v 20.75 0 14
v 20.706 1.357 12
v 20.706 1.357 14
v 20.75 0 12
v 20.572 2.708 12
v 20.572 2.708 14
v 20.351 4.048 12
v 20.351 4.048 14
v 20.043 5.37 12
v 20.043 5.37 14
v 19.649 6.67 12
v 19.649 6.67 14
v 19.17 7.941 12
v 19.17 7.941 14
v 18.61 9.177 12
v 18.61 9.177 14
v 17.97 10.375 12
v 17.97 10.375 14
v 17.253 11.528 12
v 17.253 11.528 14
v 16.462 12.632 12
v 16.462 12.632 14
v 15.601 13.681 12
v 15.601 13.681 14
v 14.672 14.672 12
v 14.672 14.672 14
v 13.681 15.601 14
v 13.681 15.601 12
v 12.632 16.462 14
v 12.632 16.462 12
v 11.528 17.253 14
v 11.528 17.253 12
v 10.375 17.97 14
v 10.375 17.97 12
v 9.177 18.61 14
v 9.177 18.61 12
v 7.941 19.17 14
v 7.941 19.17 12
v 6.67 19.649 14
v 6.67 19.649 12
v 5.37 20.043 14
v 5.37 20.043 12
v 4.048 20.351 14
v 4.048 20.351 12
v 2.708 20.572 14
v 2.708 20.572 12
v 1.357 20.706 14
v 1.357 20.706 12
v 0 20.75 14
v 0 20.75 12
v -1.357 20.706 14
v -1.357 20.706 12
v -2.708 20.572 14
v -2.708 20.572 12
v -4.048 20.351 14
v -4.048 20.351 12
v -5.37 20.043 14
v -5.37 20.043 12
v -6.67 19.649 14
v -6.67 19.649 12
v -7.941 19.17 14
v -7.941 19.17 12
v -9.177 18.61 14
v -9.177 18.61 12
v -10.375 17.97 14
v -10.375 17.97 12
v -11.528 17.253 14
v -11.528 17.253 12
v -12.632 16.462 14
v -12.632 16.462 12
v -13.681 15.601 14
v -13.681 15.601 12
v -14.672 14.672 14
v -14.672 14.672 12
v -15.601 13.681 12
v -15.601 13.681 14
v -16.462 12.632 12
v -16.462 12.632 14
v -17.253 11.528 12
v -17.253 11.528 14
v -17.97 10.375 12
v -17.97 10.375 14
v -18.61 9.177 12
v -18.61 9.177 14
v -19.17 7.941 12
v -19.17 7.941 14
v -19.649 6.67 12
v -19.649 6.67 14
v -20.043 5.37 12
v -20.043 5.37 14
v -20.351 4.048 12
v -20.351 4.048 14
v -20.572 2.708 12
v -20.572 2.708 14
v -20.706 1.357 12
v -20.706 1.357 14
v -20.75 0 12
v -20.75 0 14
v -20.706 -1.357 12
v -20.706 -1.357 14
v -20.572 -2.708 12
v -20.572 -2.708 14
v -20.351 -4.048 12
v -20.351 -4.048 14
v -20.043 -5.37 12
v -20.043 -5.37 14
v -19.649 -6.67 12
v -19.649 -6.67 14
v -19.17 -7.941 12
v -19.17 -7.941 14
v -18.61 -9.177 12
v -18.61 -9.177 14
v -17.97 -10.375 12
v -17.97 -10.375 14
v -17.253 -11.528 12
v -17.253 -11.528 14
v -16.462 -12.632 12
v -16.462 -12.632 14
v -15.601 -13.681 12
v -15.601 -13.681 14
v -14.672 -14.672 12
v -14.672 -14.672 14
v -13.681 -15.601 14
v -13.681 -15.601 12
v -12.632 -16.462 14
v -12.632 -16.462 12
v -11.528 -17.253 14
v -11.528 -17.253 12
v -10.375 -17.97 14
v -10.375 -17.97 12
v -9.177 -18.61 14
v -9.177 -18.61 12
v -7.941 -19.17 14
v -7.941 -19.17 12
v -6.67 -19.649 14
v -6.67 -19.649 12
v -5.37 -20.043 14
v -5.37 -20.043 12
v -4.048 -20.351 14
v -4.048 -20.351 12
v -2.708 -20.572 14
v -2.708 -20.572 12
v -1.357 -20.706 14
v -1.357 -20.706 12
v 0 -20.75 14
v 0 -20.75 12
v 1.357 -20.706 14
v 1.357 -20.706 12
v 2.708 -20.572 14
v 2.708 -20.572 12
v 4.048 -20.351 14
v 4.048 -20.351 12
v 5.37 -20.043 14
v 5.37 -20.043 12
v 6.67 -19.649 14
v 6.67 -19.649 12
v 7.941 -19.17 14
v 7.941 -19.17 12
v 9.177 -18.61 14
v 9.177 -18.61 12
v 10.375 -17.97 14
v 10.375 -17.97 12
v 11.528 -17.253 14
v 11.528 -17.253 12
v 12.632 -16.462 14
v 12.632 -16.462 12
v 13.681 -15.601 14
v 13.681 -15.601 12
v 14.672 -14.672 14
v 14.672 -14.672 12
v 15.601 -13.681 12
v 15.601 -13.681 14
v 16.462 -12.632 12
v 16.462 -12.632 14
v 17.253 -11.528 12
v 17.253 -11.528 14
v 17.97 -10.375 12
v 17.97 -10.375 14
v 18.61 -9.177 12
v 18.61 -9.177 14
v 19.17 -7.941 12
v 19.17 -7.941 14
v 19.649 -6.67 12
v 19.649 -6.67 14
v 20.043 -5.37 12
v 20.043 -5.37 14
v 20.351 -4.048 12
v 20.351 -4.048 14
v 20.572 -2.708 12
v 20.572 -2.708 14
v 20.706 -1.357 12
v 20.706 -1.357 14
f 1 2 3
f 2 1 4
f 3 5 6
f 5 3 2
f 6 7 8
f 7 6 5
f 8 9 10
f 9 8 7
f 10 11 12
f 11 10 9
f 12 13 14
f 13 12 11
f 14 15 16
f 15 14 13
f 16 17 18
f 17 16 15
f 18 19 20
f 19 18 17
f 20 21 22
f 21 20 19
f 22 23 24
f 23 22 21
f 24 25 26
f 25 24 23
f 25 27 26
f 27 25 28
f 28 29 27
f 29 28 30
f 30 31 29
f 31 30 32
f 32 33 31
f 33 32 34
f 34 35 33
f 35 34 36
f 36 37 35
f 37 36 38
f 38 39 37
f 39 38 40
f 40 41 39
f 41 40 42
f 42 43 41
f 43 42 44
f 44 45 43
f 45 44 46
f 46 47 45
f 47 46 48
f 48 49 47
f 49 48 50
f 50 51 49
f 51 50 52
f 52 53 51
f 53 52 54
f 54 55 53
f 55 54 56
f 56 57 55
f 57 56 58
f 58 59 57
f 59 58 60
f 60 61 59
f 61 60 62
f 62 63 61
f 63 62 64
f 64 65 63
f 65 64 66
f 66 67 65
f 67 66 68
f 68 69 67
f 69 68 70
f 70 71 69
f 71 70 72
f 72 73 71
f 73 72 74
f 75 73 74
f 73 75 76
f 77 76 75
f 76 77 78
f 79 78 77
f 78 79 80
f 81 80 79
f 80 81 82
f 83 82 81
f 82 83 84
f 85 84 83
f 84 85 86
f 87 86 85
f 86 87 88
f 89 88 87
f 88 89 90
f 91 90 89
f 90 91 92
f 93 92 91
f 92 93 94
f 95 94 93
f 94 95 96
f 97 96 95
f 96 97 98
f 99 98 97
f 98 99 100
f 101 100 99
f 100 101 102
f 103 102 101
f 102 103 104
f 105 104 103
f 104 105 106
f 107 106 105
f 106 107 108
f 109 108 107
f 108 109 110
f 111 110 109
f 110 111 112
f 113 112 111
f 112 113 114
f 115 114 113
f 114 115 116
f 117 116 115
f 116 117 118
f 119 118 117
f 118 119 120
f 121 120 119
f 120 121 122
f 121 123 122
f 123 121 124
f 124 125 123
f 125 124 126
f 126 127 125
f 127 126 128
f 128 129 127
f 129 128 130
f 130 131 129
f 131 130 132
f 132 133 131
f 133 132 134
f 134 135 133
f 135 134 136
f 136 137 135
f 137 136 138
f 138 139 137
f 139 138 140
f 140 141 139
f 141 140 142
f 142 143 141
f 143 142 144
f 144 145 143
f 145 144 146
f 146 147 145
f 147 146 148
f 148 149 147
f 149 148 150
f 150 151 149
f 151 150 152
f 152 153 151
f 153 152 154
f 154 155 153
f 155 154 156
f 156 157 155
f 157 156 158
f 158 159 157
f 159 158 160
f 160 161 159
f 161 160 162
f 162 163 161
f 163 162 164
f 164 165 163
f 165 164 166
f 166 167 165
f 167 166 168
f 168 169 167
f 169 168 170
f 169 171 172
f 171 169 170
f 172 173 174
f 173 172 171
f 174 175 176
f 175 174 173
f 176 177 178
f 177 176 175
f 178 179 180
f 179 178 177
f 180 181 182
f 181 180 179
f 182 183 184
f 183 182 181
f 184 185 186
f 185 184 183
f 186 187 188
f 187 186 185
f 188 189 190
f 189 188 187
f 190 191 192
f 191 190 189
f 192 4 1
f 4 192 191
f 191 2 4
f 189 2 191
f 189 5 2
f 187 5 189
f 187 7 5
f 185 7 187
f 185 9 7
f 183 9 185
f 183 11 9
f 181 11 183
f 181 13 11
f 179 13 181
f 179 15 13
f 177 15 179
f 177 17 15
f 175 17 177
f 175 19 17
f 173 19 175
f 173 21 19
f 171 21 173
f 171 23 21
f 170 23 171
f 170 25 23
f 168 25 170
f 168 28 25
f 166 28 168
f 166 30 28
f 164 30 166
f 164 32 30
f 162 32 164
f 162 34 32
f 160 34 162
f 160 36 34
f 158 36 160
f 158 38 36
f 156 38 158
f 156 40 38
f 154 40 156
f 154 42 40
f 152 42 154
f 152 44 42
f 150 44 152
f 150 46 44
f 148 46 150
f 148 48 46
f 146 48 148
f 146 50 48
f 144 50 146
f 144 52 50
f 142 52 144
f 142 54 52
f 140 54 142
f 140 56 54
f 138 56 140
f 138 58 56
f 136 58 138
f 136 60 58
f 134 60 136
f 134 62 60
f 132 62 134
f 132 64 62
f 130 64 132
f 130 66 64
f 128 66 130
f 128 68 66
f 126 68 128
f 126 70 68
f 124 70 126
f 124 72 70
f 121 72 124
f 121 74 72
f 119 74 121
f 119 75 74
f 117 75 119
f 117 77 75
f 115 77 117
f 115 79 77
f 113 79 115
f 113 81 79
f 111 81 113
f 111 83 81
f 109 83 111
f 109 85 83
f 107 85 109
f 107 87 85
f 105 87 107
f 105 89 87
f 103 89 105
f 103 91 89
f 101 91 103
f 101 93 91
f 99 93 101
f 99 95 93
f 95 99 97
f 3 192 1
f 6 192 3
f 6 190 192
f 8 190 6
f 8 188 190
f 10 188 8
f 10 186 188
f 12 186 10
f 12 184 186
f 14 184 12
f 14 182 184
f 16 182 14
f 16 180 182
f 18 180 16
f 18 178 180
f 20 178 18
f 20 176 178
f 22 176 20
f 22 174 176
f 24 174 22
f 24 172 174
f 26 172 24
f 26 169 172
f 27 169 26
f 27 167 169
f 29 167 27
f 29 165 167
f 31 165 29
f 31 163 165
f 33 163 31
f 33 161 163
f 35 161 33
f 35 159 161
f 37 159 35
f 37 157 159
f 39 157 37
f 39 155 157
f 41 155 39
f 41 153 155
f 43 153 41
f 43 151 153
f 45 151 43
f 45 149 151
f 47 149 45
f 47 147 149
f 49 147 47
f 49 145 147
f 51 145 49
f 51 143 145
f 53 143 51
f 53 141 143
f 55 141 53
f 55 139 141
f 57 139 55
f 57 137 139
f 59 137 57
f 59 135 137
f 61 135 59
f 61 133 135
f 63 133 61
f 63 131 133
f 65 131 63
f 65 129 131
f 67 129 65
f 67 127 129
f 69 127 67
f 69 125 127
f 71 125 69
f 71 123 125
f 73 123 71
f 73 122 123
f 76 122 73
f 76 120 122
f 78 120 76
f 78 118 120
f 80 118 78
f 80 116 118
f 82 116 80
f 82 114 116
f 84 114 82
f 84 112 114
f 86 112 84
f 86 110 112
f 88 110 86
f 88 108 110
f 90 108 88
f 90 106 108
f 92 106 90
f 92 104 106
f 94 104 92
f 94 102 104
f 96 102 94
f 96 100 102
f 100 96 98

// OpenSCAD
// ============================================================================
// glass_window_top_001.scad — Cửa sổ ép phẳng mặt nước (TÙY CHỌN)
// ----------------------------------------------------------------------------
// Tấm acrylic/lam kính Ø41.5×2 GÁC LÊN MÉP KHAY (z=12), bị vòng chặn của ống
// (z=12..14, ID40.5) đè giữ — GÁC GỜ, KHÔNG thả nổi (kính nặng hơn nước, chìm).
// Bật/tắt trong assembly bằng cờ show_window. MUA/CẮT — không in.
// ============================================================================
include <../constants.scad>

module glass_window_top() {
    color(col_acrylic)
        translate([0, 0, tray_depth])
            cylinder(d = tray_outer - 2.5, h = win_top_t, $fn = 96);
}

glass_window_top();
